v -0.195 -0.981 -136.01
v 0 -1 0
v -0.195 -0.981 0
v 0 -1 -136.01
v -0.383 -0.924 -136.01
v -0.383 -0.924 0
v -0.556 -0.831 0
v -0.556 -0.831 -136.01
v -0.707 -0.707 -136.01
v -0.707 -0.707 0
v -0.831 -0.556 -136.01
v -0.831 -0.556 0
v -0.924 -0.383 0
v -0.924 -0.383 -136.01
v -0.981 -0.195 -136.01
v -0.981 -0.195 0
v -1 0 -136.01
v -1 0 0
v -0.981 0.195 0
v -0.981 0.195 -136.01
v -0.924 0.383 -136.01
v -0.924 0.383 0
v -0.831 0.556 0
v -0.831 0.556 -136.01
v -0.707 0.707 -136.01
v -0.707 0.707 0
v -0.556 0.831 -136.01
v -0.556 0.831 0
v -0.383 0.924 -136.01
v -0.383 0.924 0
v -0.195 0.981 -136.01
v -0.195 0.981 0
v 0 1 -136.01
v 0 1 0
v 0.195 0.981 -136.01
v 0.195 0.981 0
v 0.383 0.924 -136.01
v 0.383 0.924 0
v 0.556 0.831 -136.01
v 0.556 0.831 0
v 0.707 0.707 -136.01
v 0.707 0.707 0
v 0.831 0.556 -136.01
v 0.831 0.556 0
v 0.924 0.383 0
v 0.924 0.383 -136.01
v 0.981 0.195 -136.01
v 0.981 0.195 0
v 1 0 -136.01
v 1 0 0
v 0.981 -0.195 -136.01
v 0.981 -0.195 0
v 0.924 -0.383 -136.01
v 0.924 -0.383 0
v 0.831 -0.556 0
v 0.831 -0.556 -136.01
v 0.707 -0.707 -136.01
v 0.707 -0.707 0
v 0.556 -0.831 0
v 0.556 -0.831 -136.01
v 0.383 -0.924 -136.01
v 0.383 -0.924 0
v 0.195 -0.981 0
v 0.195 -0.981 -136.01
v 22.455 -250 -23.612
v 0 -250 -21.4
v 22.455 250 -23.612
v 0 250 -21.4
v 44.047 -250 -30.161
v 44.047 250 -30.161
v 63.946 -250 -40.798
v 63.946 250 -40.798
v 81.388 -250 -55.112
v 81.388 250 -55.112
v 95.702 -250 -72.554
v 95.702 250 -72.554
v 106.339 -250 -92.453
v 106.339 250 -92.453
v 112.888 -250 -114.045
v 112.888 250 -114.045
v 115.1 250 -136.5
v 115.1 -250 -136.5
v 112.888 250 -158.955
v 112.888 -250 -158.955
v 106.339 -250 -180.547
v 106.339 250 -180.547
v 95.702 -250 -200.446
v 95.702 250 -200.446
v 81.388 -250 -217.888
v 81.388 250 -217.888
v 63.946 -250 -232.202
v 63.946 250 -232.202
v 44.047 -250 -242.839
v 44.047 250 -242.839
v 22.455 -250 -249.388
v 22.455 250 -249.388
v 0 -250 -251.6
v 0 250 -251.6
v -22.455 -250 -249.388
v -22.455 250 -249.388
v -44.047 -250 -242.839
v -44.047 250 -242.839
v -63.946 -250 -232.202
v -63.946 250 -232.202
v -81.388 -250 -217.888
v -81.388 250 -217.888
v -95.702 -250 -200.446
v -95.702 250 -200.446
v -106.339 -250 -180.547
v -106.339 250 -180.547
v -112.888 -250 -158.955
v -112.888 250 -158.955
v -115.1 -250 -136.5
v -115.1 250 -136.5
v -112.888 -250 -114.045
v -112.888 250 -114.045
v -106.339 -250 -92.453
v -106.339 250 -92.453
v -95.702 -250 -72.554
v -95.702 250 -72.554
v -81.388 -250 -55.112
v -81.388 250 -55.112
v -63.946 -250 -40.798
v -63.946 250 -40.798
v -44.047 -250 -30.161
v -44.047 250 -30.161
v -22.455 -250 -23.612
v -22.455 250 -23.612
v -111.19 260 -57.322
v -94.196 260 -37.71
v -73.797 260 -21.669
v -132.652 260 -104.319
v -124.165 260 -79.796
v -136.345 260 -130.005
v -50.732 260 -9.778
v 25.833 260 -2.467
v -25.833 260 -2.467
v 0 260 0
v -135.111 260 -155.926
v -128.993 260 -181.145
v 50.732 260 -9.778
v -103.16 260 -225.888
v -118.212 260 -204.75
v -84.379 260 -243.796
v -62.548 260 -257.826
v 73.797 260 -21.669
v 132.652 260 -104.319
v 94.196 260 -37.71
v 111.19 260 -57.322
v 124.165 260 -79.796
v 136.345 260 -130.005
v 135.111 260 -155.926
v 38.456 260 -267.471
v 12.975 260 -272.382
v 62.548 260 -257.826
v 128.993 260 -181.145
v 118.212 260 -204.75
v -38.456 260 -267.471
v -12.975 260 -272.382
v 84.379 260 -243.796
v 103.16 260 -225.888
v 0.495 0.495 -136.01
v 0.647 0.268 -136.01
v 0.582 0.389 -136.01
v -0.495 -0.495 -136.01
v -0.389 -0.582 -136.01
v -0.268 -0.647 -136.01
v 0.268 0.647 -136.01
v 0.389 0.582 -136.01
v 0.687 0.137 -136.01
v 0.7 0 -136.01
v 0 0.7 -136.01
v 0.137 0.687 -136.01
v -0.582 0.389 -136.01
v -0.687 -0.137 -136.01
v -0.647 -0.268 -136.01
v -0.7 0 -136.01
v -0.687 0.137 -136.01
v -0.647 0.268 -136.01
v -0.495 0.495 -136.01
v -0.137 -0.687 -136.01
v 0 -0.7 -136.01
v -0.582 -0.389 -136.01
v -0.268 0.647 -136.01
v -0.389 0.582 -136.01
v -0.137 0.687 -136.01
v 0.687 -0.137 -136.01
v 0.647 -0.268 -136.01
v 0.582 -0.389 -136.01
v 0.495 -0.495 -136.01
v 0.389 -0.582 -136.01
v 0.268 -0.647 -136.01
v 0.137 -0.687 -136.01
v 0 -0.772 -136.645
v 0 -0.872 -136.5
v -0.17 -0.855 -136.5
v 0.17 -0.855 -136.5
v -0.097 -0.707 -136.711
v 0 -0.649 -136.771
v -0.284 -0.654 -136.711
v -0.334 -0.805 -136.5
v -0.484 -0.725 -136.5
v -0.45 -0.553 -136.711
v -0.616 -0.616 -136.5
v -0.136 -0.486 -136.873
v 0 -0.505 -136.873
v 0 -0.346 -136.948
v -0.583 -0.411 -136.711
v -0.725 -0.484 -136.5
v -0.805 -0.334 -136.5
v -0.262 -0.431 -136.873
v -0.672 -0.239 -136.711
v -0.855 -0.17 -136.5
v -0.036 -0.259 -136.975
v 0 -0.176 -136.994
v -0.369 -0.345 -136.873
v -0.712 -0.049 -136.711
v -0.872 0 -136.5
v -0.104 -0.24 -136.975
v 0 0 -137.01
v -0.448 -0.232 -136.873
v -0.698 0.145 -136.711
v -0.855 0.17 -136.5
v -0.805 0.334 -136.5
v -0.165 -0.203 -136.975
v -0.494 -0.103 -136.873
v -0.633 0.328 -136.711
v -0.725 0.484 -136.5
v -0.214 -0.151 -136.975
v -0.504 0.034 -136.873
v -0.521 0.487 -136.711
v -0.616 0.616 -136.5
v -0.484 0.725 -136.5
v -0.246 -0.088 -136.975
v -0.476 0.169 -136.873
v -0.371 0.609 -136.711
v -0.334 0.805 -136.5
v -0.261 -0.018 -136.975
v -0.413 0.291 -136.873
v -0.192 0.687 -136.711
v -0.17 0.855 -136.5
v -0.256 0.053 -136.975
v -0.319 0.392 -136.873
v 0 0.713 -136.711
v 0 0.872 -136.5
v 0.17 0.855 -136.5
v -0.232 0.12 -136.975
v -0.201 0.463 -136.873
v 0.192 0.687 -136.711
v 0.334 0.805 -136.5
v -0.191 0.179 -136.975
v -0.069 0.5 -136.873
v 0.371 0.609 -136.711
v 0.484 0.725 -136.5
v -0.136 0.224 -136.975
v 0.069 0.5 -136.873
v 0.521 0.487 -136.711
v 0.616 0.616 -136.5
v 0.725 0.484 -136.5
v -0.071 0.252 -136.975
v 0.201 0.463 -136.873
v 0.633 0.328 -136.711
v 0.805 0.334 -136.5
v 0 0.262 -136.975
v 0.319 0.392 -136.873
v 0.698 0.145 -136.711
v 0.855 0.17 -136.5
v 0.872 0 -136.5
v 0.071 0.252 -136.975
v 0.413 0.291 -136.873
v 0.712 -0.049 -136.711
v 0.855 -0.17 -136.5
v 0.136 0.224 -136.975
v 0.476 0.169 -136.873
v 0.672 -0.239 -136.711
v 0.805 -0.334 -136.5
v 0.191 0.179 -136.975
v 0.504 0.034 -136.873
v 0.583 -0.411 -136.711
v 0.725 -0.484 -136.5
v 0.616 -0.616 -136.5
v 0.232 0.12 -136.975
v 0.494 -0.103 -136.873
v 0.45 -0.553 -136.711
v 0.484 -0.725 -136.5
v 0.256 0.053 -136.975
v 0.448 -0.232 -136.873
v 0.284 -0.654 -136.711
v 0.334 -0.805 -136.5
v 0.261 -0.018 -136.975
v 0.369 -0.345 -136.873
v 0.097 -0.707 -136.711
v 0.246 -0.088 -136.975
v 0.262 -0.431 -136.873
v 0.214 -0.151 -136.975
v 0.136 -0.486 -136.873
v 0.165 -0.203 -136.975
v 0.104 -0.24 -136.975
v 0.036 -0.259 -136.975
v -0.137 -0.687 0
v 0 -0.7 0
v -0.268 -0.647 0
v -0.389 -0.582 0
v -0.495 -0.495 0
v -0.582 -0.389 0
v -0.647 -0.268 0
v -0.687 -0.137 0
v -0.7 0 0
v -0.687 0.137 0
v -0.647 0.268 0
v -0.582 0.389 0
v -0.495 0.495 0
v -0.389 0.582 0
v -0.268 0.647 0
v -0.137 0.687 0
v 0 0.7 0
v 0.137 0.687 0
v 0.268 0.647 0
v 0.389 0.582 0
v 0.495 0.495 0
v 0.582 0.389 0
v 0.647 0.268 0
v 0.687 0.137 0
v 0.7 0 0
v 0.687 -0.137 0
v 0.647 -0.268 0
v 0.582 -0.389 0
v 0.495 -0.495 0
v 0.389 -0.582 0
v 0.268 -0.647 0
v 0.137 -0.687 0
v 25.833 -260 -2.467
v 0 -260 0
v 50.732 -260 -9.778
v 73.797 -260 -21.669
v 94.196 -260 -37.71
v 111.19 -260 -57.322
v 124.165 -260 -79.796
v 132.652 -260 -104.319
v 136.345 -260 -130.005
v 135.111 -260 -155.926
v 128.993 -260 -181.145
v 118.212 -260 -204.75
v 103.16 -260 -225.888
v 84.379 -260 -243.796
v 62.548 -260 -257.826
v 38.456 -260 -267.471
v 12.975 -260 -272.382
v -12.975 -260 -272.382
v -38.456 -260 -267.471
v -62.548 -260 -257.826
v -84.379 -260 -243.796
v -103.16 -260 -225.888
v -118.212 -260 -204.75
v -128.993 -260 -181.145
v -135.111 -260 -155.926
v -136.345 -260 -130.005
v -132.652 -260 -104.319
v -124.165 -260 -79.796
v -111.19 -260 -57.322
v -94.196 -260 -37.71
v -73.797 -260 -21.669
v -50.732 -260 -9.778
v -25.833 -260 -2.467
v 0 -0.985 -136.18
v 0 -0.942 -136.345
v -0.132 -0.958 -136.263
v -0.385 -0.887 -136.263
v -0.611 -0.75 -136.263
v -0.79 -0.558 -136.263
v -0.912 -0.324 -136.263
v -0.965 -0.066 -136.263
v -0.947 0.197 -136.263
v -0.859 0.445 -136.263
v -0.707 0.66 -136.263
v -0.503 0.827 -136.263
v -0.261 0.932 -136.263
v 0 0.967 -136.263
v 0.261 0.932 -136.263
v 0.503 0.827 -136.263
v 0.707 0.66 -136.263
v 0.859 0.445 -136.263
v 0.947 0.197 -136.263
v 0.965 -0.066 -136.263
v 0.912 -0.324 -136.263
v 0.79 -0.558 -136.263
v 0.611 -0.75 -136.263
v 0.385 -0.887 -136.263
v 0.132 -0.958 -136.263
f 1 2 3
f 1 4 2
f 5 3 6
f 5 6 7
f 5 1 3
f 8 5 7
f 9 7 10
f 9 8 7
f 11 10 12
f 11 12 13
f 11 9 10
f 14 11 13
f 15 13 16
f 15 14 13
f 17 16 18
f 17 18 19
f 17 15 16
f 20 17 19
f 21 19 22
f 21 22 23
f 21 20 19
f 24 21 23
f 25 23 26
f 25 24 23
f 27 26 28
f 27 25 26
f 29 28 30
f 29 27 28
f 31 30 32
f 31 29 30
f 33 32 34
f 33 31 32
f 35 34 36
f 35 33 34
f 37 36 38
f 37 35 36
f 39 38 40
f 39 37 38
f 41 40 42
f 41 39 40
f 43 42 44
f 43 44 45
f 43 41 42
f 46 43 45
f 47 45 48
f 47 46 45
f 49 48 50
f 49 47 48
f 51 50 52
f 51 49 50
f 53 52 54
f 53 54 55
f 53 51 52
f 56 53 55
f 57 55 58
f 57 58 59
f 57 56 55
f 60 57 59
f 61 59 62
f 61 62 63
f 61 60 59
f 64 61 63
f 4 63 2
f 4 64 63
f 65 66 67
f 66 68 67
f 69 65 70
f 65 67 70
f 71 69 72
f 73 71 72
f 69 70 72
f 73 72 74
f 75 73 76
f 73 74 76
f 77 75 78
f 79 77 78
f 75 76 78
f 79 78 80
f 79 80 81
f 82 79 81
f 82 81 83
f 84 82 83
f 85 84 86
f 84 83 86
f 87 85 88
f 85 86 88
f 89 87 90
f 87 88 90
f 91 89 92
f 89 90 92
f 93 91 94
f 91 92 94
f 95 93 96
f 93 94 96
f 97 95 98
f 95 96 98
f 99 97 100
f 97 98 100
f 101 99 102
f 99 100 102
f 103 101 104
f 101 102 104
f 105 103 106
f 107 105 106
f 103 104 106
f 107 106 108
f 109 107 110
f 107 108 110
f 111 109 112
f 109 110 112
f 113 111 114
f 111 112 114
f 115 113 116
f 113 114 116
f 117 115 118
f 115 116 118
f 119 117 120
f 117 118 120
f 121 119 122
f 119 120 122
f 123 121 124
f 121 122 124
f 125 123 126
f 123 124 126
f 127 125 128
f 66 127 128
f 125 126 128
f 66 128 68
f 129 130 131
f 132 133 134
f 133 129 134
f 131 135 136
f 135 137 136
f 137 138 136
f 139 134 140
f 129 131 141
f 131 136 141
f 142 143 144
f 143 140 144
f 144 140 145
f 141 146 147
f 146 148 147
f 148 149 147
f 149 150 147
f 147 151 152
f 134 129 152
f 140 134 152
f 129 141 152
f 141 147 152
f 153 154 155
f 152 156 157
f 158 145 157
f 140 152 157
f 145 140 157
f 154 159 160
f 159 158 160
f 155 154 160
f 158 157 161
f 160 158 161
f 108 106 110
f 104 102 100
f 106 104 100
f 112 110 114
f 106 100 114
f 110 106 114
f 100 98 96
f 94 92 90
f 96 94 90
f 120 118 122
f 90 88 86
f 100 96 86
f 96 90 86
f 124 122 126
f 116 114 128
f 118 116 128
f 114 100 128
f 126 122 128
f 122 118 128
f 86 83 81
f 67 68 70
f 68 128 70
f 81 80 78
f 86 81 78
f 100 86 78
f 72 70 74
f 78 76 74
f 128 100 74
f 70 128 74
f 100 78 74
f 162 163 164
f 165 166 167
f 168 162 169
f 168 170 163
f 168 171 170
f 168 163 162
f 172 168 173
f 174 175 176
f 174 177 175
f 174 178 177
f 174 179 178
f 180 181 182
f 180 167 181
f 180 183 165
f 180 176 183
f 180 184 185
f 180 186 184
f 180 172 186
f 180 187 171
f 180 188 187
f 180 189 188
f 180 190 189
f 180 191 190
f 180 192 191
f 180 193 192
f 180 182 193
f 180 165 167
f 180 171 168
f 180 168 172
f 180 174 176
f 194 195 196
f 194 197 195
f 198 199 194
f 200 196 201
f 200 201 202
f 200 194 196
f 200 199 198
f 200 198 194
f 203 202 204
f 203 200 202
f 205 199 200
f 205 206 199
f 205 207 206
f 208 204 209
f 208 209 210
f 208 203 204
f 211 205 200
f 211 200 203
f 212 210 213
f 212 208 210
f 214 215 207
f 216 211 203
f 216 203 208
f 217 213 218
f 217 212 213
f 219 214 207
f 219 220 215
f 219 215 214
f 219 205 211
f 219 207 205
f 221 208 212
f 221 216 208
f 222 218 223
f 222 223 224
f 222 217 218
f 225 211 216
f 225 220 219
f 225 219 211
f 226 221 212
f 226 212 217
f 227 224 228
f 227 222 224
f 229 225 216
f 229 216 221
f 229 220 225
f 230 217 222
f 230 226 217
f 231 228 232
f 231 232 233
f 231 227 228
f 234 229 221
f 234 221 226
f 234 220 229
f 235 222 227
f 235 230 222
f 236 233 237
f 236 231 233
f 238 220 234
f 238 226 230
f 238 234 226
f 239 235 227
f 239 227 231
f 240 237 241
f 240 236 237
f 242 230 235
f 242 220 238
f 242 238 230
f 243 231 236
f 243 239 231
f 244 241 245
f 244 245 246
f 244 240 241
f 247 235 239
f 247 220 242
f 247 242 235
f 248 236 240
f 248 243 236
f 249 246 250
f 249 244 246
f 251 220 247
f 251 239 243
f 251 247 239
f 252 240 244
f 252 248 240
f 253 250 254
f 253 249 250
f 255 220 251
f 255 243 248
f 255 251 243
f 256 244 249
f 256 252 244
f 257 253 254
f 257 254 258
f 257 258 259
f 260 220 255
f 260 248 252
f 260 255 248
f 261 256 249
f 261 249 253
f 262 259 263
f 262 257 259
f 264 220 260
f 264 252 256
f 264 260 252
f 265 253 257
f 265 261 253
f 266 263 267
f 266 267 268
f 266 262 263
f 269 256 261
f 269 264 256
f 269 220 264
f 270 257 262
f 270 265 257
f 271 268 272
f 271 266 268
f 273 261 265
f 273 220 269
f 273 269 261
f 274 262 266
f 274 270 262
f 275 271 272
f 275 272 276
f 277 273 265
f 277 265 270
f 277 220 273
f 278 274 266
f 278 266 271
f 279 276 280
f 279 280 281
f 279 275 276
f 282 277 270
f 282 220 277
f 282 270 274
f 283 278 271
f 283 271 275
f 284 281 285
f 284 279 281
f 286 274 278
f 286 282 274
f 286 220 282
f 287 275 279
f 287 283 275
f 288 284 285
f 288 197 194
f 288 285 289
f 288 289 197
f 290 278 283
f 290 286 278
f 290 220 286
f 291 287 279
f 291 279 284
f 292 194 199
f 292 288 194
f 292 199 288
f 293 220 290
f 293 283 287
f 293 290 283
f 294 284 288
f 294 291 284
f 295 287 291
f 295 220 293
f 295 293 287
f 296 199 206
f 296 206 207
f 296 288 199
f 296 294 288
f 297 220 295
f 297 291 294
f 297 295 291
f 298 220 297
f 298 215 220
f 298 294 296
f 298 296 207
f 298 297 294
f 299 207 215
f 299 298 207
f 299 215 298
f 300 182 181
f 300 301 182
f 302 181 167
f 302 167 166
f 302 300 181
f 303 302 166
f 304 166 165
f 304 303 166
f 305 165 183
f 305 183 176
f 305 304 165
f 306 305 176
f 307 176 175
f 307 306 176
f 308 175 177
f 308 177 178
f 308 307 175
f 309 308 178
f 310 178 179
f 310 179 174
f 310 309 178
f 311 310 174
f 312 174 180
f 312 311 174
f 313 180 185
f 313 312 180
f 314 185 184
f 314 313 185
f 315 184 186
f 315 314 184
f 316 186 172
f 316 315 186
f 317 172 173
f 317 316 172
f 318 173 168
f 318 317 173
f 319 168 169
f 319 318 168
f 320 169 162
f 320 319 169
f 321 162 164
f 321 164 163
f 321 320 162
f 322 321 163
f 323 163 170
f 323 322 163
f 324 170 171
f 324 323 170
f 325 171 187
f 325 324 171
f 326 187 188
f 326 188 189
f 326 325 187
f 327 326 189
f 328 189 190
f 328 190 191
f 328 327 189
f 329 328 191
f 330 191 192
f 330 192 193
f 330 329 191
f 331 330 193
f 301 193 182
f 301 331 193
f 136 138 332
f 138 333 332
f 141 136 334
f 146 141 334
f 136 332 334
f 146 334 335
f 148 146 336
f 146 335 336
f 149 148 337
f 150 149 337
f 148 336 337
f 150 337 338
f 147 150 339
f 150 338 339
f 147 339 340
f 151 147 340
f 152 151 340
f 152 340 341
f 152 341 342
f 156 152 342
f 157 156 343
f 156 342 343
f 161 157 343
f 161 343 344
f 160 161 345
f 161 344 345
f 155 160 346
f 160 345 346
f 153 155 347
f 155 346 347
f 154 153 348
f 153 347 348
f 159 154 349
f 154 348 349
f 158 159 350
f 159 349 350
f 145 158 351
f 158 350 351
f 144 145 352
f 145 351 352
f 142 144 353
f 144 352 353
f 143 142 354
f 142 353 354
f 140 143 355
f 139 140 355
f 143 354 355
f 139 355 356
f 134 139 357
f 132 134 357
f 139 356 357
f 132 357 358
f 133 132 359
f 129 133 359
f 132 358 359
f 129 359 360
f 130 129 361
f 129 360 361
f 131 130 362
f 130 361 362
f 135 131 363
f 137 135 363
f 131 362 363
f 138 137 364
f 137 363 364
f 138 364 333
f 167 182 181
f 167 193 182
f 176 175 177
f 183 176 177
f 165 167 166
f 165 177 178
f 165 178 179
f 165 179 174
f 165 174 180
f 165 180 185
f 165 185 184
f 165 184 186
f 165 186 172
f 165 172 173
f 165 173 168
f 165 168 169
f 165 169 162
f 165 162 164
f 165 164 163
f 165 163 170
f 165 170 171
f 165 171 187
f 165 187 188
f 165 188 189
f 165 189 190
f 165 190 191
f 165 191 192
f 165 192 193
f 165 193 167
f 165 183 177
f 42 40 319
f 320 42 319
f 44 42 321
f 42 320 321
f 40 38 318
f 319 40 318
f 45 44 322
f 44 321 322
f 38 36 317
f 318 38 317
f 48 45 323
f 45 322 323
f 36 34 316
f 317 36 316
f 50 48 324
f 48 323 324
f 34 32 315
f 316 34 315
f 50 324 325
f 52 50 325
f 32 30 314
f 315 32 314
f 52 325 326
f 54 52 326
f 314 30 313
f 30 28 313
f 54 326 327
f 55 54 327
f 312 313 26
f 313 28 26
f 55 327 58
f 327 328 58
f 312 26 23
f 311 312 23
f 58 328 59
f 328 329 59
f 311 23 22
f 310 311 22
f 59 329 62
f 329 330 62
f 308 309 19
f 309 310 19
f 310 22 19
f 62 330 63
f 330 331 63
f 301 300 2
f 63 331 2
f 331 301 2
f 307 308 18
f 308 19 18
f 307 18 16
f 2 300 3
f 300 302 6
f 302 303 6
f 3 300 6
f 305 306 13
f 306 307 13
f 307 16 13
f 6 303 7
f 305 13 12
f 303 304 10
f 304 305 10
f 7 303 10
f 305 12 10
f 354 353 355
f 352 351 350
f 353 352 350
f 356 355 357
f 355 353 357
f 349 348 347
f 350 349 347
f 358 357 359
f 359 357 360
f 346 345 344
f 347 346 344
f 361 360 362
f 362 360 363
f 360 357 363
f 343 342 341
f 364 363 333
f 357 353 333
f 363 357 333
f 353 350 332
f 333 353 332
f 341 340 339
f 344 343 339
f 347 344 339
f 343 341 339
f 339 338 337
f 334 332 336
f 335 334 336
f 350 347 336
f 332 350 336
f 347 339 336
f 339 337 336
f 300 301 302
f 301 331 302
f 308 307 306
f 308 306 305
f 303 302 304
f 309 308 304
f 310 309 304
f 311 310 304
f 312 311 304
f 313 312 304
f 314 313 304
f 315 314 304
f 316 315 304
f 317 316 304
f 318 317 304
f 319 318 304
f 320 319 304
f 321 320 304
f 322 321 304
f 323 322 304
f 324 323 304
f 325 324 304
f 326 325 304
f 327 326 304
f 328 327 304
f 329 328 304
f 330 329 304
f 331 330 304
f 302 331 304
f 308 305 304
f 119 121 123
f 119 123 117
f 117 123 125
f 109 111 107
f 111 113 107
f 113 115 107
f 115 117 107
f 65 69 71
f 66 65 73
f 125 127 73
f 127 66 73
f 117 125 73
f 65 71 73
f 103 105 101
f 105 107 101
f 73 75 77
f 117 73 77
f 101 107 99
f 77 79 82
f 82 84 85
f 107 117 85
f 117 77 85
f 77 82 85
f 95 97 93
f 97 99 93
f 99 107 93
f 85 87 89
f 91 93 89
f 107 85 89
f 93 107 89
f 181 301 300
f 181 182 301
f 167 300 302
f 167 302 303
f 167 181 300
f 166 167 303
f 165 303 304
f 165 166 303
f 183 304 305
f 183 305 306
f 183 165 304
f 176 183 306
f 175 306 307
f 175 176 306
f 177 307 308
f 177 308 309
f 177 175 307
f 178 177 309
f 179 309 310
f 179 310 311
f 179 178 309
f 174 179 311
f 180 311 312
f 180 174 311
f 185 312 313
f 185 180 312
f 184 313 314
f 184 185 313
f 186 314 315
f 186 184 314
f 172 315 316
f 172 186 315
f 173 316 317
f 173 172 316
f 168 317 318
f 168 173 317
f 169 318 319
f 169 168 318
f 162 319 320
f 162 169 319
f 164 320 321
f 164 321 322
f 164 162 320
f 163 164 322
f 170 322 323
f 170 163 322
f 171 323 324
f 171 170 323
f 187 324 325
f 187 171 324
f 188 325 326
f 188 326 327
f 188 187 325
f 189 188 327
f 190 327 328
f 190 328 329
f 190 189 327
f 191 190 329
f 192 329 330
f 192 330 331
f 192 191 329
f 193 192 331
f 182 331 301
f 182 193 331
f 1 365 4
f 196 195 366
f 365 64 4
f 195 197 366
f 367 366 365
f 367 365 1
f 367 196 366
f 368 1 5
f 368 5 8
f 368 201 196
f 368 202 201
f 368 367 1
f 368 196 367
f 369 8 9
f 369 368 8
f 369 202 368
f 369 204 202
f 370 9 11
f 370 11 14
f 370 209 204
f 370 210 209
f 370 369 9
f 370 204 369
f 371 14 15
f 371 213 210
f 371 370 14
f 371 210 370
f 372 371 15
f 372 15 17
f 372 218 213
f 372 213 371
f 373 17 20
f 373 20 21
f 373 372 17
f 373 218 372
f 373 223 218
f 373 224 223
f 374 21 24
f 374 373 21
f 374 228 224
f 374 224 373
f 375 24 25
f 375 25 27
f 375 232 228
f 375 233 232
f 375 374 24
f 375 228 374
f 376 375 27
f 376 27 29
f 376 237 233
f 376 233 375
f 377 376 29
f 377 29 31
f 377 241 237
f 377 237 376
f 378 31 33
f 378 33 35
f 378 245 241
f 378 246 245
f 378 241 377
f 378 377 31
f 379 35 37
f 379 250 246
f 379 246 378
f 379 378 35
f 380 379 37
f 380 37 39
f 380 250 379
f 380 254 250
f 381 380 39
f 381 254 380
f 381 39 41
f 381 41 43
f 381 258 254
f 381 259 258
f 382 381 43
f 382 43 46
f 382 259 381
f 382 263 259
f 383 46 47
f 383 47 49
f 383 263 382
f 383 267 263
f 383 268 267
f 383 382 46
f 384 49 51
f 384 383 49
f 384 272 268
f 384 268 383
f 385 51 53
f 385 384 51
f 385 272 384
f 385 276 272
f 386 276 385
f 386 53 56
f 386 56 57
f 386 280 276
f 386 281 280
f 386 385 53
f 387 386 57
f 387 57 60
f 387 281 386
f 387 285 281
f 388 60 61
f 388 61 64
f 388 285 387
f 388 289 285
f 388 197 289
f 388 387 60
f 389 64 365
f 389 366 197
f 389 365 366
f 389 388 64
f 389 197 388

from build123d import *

# Parameters (mm, degrees)
F0_W   = 0.3
F0_H   = 21.4
F0_W_2 = 0.7
F0_H_2 = 114.61
F0_W_3 = 10
F0_H_3 = 115.1
F0_W_4 = 249


with BuildPart() as f1:
    # F0 (on Right) → F1 (revolve)
    with BuildSketch(Plane.YZ):
        with BuildLine():
            Line((-0.7, -136.01), (-0.7, -21.4))
            Line((-0.7, -21.4), (-1, -21.4))
            Line((-1, -21.4), (-1, -136.01))
            ThreePointArc((-1, -136.01), (-0.9673992022, -136.2632563594), (-0.8717224329, -136.5))
            Line((-0.8717224329, -136.5), (0, -136.5))
            Line((0, -136.5), (0, -136.01))
            Line((0, -136.01), (-0.7, -136.01))
        make_face()
        with BuildLine():
            Line((0, -137.01), (0, -136.5))
            Line((0, -136.5), (-0.8717224329, -136.5))
            ThreePointArc((-0.8717224329, -136.5), (-0.5049752469, -136.8731338251), (0, -137.01))
        make_face()
        with Locations((-0.85, -10.7)):
            Rectangle(F0_W, F0_H)
    revolve(axis=Axis((0, 0, 263.5), (0, 0, -1)))


with BuildPart() as f2:
    # F0 (on Right) → F2 (revolve)
    with BuildSketch(Plane.YZ):
        with Locations((-0.35, -78.705)):
            Rectangle(F0_W_2, F0_H_2)
        with Locations((-0.35, -10.7)):
            Rectangle(F0_W_2, F0_H)
    revolve(axis=Axis((0, 0, 263.5), (0, 0, -1)))


with BuildPart() as f3:
    # F0 (on Right) → F3 (revolve)
    with BuildSketch(Plane.YZ):
        with Locations((255, -10.7)):
            Rectangle(F0_W_3, F0_H)
        with Locations((255, -78.95)):
            Rectangle(F0_W_3, F0_H_3)
        with Locations((125.5, -10.7)):
            Rectangle(F0_W_4, F0_H)
        with Locations((-125.5, -10.7)):
            Rectangle(F0_W_4, F0_H)
        with Locations((0.85, -10.7)):
            Rectangle(F0_W, F0_H)
        with Locations((-0.85, -10.7)):
            Rectangle(F0_W, F0_H)
        with Locations((0.35, -10.7)):
            Rectangle(F0_W_2, F0_H)
        with Locations((-0.35, -10.7)):
            Rectangle(F0_W_2, F0_H)
        with Locations((-255, -10.7)):
            Rectangle(F0_W_3, F0_H)
        with Locations((-255, -78.95)):
            Rectangle(F0_W_3, F0_H_3)
    revolve(axis=Axis((0, 0, -136.5), (0, 1, 0)))


solid = Compound([f1.part, f2.part, f3.part])
